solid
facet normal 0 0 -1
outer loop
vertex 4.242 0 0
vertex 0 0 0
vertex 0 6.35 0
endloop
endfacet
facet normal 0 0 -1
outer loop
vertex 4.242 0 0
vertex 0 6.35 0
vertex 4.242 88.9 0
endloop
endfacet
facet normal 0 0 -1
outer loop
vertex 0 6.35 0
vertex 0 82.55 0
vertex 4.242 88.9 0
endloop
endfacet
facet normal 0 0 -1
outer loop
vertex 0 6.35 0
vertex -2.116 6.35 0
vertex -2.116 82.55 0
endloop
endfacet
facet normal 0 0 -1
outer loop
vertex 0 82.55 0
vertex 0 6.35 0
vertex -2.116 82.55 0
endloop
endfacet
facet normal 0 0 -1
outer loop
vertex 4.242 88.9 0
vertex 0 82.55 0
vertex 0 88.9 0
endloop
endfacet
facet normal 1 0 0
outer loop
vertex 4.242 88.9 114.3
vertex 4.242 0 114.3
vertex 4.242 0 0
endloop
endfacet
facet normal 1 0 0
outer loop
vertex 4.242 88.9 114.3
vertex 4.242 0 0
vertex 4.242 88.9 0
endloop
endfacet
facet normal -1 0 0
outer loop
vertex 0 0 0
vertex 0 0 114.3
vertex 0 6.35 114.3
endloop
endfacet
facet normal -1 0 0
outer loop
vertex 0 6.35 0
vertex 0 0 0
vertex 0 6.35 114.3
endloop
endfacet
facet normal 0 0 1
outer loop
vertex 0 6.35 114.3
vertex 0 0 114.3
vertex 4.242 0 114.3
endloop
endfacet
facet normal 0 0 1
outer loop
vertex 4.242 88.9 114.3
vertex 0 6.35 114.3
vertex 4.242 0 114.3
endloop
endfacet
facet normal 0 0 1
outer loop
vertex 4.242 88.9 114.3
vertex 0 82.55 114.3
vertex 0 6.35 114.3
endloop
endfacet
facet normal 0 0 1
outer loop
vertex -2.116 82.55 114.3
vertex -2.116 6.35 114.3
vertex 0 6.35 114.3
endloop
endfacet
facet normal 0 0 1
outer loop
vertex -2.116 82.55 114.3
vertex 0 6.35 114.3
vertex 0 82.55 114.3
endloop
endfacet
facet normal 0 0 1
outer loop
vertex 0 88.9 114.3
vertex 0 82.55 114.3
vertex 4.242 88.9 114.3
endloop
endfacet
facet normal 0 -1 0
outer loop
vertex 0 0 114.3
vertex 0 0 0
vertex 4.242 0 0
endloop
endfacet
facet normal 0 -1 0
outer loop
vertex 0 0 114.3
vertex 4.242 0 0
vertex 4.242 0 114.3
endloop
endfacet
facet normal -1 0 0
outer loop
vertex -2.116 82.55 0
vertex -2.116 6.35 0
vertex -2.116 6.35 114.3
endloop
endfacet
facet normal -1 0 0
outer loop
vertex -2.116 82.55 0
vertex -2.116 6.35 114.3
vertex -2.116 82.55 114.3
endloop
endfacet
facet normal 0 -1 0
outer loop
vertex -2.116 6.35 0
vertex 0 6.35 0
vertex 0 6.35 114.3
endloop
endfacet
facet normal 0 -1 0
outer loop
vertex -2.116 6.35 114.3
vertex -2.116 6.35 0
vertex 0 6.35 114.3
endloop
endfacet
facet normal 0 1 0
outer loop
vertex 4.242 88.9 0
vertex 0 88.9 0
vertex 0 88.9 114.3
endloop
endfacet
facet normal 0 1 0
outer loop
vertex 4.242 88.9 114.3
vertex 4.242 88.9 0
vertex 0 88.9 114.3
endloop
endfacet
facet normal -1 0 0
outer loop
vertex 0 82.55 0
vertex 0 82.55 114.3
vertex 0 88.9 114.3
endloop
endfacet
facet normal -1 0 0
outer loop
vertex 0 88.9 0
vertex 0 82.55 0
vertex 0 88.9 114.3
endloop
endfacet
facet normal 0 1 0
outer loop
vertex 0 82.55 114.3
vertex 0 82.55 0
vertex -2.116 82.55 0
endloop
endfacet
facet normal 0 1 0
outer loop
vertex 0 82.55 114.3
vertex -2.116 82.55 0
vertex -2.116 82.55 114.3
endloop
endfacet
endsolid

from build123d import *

# Parameters (mm, degrees)
F0_W     = 88.9
F0_H     = 114.3
F1_DEPTH = 4.2418
F2_W     = 76.2
F2_H     = 114.3
F3_DEPTH = 2.11582


# Not quite as in the source:
# - a feature names something its author has since deleted; it is built from what else it names


with BuildPart() as f1:
    # F0 (on Right) → F1 (new body)
    with BuildSketch(Plane.YZ):
        with Locations((44.45, 57.15)):
            Rectangle(F0_W, F0_H)
    extrude(amount=F1_DEPTH)

    # F2 (on Right) → F3 (join)
    with BuildSketch(Plane.YZ):
        with Locations((44.45, 57.15)):
            Rectangle(F2_W, F2_H)
    extrude(amount=-F3_DEPTH)


solid = f1.part
